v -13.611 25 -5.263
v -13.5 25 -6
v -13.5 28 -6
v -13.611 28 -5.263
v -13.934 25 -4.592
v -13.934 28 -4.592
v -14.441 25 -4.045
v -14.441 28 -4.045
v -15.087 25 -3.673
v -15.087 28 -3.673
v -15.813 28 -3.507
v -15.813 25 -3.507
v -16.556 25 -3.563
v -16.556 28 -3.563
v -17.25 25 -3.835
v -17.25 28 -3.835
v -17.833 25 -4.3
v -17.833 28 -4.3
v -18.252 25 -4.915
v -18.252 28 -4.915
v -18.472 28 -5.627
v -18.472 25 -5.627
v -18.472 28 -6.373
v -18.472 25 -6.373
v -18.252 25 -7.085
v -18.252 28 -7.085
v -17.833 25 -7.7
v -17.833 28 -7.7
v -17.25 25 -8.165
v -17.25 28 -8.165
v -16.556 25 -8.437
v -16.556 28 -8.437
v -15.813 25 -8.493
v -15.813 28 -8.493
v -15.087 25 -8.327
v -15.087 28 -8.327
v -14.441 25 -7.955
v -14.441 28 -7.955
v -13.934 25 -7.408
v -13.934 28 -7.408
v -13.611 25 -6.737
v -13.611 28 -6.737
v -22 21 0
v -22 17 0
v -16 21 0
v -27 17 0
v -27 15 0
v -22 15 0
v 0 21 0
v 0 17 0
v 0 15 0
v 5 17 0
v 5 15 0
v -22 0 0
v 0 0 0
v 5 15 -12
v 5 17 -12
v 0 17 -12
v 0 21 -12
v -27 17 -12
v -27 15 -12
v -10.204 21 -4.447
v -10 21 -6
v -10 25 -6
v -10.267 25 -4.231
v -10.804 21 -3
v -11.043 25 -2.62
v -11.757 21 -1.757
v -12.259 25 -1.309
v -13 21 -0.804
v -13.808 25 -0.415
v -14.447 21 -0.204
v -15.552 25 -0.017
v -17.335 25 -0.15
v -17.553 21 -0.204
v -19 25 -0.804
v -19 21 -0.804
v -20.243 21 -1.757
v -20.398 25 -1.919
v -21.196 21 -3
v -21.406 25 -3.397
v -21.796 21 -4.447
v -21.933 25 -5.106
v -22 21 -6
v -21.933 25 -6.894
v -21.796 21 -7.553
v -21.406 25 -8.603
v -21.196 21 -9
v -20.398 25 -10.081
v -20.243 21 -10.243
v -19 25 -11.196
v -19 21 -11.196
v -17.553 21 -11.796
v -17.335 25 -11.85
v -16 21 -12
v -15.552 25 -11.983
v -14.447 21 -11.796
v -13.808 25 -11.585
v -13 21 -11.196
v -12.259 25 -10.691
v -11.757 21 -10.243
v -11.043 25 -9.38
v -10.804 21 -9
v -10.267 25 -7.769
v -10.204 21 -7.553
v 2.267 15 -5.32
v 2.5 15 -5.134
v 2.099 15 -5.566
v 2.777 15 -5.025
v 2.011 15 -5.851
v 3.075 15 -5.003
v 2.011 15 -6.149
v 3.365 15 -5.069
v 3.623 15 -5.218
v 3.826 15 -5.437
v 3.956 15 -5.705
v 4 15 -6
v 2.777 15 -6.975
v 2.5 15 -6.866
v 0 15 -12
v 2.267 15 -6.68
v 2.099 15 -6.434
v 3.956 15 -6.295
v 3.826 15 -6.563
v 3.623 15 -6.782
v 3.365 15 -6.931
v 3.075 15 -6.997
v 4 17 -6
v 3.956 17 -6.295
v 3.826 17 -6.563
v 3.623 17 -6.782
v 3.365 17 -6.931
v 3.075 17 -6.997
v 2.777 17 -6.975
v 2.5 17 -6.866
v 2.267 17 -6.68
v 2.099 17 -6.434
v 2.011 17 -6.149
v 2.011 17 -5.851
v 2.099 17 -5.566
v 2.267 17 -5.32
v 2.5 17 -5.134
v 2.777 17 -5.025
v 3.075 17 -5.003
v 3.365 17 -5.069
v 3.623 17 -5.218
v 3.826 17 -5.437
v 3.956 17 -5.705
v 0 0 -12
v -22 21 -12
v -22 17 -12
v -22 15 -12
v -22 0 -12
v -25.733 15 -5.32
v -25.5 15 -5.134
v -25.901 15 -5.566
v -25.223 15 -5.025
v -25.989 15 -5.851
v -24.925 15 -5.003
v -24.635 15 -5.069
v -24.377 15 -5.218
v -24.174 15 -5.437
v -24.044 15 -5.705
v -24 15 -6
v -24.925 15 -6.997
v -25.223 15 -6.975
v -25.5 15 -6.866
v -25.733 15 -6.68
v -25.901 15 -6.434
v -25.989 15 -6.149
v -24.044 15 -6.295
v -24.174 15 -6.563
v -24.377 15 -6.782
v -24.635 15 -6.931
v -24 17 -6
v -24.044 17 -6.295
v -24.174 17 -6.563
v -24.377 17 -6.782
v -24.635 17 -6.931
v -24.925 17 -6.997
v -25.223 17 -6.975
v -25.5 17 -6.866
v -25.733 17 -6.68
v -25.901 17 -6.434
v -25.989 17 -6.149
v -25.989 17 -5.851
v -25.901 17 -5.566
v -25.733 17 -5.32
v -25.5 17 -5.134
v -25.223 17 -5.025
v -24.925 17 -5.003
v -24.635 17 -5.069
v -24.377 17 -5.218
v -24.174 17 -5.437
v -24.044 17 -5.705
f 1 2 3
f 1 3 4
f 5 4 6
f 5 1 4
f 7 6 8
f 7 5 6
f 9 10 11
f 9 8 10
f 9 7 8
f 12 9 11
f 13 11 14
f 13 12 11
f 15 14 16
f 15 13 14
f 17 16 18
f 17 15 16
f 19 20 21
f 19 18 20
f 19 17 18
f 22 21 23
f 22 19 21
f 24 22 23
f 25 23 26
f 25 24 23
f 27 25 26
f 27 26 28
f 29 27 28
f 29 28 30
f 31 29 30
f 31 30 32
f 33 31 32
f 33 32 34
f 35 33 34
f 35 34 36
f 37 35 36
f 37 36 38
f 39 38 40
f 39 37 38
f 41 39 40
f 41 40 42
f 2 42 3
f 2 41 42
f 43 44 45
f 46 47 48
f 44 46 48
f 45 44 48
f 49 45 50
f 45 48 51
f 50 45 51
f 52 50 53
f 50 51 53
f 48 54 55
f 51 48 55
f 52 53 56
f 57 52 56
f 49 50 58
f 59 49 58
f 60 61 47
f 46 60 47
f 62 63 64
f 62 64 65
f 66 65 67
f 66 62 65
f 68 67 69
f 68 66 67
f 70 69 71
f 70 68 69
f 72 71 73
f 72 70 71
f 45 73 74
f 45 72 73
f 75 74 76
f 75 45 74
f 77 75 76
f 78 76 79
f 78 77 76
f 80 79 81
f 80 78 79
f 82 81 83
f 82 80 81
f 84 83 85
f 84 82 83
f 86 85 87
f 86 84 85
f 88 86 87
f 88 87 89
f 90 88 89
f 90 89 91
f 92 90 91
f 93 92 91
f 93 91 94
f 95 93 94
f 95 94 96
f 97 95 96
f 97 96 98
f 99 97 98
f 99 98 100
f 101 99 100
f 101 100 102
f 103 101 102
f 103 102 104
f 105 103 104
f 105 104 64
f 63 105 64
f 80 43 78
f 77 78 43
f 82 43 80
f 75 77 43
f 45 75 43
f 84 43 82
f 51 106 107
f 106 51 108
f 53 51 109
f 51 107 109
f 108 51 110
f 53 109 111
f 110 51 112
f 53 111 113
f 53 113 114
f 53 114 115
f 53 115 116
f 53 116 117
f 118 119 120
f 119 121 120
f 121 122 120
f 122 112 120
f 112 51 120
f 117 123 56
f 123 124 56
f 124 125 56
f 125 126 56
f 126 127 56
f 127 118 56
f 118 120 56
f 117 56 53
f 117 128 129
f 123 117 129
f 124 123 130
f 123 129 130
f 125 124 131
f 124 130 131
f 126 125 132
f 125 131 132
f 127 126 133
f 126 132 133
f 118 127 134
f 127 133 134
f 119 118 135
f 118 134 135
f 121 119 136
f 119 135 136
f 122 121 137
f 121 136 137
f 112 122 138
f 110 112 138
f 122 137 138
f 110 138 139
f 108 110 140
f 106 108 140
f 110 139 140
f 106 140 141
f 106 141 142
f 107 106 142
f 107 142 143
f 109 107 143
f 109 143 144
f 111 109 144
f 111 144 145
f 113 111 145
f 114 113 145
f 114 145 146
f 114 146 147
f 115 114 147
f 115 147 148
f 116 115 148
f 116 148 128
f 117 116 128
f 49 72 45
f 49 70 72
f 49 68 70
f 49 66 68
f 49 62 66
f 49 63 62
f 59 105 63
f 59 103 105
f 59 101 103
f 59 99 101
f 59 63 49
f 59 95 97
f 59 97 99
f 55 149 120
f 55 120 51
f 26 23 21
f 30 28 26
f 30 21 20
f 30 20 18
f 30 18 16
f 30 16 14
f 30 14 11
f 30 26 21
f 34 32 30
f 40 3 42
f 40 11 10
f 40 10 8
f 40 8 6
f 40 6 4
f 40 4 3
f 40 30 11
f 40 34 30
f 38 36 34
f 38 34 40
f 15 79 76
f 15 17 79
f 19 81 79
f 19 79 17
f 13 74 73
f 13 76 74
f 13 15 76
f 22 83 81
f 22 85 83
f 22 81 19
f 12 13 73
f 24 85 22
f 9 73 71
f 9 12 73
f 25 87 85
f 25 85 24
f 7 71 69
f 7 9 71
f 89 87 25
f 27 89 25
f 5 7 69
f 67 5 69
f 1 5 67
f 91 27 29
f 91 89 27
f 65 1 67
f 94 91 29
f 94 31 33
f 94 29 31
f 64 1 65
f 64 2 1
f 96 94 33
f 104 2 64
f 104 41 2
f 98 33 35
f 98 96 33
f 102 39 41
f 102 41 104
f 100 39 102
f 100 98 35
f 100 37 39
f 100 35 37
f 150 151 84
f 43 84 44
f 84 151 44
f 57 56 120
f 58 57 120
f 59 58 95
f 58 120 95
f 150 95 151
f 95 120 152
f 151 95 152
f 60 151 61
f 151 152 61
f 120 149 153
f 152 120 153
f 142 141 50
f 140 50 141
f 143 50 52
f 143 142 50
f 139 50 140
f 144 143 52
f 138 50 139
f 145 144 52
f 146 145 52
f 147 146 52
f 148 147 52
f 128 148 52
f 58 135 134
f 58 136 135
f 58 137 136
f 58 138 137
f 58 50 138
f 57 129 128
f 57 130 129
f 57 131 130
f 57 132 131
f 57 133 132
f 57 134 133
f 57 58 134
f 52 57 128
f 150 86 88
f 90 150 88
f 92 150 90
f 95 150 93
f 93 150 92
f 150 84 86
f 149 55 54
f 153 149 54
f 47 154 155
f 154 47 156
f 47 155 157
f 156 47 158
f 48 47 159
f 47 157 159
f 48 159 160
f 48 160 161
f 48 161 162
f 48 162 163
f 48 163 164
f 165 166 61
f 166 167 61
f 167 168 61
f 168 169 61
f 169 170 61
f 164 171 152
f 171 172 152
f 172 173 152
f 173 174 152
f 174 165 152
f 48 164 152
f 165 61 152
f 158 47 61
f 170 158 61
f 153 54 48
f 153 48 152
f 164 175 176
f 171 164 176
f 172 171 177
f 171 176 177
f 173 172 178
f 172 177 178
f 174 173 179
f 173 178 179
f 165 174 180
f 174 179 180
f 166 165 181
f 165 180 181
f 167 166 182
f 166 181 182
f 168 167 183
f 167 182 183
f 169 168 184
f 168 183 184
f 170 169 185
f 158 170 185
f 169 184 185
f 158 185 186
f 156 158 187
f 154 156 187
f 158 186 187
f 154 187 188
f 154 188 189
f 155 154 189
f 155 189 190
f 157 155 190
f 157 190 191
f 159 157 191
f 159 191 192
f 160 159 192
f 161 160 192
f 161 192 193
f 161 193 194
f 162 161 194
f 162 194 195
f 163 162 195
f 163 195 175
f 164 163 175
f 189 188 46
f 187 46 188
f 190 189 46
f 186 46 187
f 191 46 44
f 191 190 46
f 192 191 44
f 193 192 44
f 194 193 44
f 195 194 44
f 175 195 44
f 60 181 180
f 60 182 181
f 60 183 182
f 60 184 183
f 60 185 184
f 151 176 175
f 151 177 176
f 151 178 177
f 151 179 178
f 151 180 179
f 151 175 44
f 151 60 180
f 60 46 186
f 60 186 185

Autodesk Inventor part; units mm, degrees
ref_plane "YZ Plane" through (0, 0, 0) normal (1, 0, 0) x (0, 1, 0)
ref_plane "XZ Plane" through (0, 0, 0) normal (0, 1, 0) x (-1, 0, 0)
ref_plane "XY Plane" through (0, 0, 0) normal (0, 0, 1) x (1, 0, 0)
sketch "Sketch1" plane through (0, 0, 0) normal (0, 1, 0) x (-1, 0, 0)
  line L0 (0, 0) -> (22, 0)
  line L1 (22, 0) -> (22, -12)
  line L2 (22, -12) -> (0, -12)
  line L3 (0, -12) -> (0, 0)
  dimension "d0" = 22
  dimension "d1" = 12
extrude "Extrusion1" add sketch "Sketch1" along normal blind 15
sketch "Sketch2" plane through (0, 15, 0) normal (0, 1, 0) x (1, 0, 0)
  line L0 (-27, 0) -> (5, 0)
  line L1 (5, 0) -> (5, 12)
  line L2 (5, 12) -> (-27, 12)
  line L3 (-27, 12) -> (-27, 0)
  line L4 (-22, 12) -> (-22, 0) projected
  line L5 (0, 0) -> (0, 12) projected
  point P0 (-22, 6)
  dimension "d4" = 5
  dimension "d5" = 5
extrude "Extrusion2" add sketch "Sketch2" along normal blind 2
sketch "Sketch3" plane through (0, 17, 0) normal (0, 1, 0) x (1, 0, 0)
  line L0 (-22, 0) -> (0, 0) projected
  line L1 (5, 12) -> (-27, 12) projected
  line L2 (-22, 0) -> (0, 0)
  line L3 (0, 0) -> (0, 12)
  line L4 (0, 12) -> (-22, 12)
  line L5 (-22, 12) -> (-22, 0)
  line L6 (0, 0) -> (0, 12) projected
extrude "Extrusion3" add sketch "Sketch3" along normal blind 4
sketch "Sketch4" plane through (0, 21, 0) normal (0, 1, 0) x (1, 0, 0)
  circle A0 centre (-16, 6) radius 6
  line L0 (-22, 12) -> (-22, 0) projected
  line L1 (0, 12) -> (-22, 12) projected
  point P0 (0, 0)
  dimension "d10" = 12
extrude "Extrusion4" add sketch "Sketch4" along normal blind 4 contours A0
sketch "Sketch5" plane through (-16, 25, -6) normal (0, 1, 0) x (1, 0, 0)
  circle A0 centre (0, 0) radius 2.5
  circle A1 centre (0, 0) radius 6 projected
  point P0 (16, -6)
  dimension "d13" = 5
extrude "Extrusion5" add sketch "Sketch5" along normal blind 3 contours A0
sketch "Sketch6" plane through (0, 17, 0) normal (0, 1, 0) x (1, 0, 0)
  circle A0 centre (3, 6) radius 1
  circle A1 centre (-25, 6) radius 1
  line L0 (-27, 0) -> (-22, 0) projected
  line L1 (0, 0) -> (5, 0) projected
  line L2 (-27, 12) -> (-27, 0) projected
  point P0 (-24.5, 0)
  point P1 (2.5, 0)
  dimension "d16" = 2
  dimension "d17" = 2
  dimension "d18" = 6
  dimension "d19" = 6
  dimension "d20" = 28
  dimension "d21" = 2
extrude "Extrusion6" cut sketch "Sketch6" against normal through all
properties part number "SG-90-Servo"
